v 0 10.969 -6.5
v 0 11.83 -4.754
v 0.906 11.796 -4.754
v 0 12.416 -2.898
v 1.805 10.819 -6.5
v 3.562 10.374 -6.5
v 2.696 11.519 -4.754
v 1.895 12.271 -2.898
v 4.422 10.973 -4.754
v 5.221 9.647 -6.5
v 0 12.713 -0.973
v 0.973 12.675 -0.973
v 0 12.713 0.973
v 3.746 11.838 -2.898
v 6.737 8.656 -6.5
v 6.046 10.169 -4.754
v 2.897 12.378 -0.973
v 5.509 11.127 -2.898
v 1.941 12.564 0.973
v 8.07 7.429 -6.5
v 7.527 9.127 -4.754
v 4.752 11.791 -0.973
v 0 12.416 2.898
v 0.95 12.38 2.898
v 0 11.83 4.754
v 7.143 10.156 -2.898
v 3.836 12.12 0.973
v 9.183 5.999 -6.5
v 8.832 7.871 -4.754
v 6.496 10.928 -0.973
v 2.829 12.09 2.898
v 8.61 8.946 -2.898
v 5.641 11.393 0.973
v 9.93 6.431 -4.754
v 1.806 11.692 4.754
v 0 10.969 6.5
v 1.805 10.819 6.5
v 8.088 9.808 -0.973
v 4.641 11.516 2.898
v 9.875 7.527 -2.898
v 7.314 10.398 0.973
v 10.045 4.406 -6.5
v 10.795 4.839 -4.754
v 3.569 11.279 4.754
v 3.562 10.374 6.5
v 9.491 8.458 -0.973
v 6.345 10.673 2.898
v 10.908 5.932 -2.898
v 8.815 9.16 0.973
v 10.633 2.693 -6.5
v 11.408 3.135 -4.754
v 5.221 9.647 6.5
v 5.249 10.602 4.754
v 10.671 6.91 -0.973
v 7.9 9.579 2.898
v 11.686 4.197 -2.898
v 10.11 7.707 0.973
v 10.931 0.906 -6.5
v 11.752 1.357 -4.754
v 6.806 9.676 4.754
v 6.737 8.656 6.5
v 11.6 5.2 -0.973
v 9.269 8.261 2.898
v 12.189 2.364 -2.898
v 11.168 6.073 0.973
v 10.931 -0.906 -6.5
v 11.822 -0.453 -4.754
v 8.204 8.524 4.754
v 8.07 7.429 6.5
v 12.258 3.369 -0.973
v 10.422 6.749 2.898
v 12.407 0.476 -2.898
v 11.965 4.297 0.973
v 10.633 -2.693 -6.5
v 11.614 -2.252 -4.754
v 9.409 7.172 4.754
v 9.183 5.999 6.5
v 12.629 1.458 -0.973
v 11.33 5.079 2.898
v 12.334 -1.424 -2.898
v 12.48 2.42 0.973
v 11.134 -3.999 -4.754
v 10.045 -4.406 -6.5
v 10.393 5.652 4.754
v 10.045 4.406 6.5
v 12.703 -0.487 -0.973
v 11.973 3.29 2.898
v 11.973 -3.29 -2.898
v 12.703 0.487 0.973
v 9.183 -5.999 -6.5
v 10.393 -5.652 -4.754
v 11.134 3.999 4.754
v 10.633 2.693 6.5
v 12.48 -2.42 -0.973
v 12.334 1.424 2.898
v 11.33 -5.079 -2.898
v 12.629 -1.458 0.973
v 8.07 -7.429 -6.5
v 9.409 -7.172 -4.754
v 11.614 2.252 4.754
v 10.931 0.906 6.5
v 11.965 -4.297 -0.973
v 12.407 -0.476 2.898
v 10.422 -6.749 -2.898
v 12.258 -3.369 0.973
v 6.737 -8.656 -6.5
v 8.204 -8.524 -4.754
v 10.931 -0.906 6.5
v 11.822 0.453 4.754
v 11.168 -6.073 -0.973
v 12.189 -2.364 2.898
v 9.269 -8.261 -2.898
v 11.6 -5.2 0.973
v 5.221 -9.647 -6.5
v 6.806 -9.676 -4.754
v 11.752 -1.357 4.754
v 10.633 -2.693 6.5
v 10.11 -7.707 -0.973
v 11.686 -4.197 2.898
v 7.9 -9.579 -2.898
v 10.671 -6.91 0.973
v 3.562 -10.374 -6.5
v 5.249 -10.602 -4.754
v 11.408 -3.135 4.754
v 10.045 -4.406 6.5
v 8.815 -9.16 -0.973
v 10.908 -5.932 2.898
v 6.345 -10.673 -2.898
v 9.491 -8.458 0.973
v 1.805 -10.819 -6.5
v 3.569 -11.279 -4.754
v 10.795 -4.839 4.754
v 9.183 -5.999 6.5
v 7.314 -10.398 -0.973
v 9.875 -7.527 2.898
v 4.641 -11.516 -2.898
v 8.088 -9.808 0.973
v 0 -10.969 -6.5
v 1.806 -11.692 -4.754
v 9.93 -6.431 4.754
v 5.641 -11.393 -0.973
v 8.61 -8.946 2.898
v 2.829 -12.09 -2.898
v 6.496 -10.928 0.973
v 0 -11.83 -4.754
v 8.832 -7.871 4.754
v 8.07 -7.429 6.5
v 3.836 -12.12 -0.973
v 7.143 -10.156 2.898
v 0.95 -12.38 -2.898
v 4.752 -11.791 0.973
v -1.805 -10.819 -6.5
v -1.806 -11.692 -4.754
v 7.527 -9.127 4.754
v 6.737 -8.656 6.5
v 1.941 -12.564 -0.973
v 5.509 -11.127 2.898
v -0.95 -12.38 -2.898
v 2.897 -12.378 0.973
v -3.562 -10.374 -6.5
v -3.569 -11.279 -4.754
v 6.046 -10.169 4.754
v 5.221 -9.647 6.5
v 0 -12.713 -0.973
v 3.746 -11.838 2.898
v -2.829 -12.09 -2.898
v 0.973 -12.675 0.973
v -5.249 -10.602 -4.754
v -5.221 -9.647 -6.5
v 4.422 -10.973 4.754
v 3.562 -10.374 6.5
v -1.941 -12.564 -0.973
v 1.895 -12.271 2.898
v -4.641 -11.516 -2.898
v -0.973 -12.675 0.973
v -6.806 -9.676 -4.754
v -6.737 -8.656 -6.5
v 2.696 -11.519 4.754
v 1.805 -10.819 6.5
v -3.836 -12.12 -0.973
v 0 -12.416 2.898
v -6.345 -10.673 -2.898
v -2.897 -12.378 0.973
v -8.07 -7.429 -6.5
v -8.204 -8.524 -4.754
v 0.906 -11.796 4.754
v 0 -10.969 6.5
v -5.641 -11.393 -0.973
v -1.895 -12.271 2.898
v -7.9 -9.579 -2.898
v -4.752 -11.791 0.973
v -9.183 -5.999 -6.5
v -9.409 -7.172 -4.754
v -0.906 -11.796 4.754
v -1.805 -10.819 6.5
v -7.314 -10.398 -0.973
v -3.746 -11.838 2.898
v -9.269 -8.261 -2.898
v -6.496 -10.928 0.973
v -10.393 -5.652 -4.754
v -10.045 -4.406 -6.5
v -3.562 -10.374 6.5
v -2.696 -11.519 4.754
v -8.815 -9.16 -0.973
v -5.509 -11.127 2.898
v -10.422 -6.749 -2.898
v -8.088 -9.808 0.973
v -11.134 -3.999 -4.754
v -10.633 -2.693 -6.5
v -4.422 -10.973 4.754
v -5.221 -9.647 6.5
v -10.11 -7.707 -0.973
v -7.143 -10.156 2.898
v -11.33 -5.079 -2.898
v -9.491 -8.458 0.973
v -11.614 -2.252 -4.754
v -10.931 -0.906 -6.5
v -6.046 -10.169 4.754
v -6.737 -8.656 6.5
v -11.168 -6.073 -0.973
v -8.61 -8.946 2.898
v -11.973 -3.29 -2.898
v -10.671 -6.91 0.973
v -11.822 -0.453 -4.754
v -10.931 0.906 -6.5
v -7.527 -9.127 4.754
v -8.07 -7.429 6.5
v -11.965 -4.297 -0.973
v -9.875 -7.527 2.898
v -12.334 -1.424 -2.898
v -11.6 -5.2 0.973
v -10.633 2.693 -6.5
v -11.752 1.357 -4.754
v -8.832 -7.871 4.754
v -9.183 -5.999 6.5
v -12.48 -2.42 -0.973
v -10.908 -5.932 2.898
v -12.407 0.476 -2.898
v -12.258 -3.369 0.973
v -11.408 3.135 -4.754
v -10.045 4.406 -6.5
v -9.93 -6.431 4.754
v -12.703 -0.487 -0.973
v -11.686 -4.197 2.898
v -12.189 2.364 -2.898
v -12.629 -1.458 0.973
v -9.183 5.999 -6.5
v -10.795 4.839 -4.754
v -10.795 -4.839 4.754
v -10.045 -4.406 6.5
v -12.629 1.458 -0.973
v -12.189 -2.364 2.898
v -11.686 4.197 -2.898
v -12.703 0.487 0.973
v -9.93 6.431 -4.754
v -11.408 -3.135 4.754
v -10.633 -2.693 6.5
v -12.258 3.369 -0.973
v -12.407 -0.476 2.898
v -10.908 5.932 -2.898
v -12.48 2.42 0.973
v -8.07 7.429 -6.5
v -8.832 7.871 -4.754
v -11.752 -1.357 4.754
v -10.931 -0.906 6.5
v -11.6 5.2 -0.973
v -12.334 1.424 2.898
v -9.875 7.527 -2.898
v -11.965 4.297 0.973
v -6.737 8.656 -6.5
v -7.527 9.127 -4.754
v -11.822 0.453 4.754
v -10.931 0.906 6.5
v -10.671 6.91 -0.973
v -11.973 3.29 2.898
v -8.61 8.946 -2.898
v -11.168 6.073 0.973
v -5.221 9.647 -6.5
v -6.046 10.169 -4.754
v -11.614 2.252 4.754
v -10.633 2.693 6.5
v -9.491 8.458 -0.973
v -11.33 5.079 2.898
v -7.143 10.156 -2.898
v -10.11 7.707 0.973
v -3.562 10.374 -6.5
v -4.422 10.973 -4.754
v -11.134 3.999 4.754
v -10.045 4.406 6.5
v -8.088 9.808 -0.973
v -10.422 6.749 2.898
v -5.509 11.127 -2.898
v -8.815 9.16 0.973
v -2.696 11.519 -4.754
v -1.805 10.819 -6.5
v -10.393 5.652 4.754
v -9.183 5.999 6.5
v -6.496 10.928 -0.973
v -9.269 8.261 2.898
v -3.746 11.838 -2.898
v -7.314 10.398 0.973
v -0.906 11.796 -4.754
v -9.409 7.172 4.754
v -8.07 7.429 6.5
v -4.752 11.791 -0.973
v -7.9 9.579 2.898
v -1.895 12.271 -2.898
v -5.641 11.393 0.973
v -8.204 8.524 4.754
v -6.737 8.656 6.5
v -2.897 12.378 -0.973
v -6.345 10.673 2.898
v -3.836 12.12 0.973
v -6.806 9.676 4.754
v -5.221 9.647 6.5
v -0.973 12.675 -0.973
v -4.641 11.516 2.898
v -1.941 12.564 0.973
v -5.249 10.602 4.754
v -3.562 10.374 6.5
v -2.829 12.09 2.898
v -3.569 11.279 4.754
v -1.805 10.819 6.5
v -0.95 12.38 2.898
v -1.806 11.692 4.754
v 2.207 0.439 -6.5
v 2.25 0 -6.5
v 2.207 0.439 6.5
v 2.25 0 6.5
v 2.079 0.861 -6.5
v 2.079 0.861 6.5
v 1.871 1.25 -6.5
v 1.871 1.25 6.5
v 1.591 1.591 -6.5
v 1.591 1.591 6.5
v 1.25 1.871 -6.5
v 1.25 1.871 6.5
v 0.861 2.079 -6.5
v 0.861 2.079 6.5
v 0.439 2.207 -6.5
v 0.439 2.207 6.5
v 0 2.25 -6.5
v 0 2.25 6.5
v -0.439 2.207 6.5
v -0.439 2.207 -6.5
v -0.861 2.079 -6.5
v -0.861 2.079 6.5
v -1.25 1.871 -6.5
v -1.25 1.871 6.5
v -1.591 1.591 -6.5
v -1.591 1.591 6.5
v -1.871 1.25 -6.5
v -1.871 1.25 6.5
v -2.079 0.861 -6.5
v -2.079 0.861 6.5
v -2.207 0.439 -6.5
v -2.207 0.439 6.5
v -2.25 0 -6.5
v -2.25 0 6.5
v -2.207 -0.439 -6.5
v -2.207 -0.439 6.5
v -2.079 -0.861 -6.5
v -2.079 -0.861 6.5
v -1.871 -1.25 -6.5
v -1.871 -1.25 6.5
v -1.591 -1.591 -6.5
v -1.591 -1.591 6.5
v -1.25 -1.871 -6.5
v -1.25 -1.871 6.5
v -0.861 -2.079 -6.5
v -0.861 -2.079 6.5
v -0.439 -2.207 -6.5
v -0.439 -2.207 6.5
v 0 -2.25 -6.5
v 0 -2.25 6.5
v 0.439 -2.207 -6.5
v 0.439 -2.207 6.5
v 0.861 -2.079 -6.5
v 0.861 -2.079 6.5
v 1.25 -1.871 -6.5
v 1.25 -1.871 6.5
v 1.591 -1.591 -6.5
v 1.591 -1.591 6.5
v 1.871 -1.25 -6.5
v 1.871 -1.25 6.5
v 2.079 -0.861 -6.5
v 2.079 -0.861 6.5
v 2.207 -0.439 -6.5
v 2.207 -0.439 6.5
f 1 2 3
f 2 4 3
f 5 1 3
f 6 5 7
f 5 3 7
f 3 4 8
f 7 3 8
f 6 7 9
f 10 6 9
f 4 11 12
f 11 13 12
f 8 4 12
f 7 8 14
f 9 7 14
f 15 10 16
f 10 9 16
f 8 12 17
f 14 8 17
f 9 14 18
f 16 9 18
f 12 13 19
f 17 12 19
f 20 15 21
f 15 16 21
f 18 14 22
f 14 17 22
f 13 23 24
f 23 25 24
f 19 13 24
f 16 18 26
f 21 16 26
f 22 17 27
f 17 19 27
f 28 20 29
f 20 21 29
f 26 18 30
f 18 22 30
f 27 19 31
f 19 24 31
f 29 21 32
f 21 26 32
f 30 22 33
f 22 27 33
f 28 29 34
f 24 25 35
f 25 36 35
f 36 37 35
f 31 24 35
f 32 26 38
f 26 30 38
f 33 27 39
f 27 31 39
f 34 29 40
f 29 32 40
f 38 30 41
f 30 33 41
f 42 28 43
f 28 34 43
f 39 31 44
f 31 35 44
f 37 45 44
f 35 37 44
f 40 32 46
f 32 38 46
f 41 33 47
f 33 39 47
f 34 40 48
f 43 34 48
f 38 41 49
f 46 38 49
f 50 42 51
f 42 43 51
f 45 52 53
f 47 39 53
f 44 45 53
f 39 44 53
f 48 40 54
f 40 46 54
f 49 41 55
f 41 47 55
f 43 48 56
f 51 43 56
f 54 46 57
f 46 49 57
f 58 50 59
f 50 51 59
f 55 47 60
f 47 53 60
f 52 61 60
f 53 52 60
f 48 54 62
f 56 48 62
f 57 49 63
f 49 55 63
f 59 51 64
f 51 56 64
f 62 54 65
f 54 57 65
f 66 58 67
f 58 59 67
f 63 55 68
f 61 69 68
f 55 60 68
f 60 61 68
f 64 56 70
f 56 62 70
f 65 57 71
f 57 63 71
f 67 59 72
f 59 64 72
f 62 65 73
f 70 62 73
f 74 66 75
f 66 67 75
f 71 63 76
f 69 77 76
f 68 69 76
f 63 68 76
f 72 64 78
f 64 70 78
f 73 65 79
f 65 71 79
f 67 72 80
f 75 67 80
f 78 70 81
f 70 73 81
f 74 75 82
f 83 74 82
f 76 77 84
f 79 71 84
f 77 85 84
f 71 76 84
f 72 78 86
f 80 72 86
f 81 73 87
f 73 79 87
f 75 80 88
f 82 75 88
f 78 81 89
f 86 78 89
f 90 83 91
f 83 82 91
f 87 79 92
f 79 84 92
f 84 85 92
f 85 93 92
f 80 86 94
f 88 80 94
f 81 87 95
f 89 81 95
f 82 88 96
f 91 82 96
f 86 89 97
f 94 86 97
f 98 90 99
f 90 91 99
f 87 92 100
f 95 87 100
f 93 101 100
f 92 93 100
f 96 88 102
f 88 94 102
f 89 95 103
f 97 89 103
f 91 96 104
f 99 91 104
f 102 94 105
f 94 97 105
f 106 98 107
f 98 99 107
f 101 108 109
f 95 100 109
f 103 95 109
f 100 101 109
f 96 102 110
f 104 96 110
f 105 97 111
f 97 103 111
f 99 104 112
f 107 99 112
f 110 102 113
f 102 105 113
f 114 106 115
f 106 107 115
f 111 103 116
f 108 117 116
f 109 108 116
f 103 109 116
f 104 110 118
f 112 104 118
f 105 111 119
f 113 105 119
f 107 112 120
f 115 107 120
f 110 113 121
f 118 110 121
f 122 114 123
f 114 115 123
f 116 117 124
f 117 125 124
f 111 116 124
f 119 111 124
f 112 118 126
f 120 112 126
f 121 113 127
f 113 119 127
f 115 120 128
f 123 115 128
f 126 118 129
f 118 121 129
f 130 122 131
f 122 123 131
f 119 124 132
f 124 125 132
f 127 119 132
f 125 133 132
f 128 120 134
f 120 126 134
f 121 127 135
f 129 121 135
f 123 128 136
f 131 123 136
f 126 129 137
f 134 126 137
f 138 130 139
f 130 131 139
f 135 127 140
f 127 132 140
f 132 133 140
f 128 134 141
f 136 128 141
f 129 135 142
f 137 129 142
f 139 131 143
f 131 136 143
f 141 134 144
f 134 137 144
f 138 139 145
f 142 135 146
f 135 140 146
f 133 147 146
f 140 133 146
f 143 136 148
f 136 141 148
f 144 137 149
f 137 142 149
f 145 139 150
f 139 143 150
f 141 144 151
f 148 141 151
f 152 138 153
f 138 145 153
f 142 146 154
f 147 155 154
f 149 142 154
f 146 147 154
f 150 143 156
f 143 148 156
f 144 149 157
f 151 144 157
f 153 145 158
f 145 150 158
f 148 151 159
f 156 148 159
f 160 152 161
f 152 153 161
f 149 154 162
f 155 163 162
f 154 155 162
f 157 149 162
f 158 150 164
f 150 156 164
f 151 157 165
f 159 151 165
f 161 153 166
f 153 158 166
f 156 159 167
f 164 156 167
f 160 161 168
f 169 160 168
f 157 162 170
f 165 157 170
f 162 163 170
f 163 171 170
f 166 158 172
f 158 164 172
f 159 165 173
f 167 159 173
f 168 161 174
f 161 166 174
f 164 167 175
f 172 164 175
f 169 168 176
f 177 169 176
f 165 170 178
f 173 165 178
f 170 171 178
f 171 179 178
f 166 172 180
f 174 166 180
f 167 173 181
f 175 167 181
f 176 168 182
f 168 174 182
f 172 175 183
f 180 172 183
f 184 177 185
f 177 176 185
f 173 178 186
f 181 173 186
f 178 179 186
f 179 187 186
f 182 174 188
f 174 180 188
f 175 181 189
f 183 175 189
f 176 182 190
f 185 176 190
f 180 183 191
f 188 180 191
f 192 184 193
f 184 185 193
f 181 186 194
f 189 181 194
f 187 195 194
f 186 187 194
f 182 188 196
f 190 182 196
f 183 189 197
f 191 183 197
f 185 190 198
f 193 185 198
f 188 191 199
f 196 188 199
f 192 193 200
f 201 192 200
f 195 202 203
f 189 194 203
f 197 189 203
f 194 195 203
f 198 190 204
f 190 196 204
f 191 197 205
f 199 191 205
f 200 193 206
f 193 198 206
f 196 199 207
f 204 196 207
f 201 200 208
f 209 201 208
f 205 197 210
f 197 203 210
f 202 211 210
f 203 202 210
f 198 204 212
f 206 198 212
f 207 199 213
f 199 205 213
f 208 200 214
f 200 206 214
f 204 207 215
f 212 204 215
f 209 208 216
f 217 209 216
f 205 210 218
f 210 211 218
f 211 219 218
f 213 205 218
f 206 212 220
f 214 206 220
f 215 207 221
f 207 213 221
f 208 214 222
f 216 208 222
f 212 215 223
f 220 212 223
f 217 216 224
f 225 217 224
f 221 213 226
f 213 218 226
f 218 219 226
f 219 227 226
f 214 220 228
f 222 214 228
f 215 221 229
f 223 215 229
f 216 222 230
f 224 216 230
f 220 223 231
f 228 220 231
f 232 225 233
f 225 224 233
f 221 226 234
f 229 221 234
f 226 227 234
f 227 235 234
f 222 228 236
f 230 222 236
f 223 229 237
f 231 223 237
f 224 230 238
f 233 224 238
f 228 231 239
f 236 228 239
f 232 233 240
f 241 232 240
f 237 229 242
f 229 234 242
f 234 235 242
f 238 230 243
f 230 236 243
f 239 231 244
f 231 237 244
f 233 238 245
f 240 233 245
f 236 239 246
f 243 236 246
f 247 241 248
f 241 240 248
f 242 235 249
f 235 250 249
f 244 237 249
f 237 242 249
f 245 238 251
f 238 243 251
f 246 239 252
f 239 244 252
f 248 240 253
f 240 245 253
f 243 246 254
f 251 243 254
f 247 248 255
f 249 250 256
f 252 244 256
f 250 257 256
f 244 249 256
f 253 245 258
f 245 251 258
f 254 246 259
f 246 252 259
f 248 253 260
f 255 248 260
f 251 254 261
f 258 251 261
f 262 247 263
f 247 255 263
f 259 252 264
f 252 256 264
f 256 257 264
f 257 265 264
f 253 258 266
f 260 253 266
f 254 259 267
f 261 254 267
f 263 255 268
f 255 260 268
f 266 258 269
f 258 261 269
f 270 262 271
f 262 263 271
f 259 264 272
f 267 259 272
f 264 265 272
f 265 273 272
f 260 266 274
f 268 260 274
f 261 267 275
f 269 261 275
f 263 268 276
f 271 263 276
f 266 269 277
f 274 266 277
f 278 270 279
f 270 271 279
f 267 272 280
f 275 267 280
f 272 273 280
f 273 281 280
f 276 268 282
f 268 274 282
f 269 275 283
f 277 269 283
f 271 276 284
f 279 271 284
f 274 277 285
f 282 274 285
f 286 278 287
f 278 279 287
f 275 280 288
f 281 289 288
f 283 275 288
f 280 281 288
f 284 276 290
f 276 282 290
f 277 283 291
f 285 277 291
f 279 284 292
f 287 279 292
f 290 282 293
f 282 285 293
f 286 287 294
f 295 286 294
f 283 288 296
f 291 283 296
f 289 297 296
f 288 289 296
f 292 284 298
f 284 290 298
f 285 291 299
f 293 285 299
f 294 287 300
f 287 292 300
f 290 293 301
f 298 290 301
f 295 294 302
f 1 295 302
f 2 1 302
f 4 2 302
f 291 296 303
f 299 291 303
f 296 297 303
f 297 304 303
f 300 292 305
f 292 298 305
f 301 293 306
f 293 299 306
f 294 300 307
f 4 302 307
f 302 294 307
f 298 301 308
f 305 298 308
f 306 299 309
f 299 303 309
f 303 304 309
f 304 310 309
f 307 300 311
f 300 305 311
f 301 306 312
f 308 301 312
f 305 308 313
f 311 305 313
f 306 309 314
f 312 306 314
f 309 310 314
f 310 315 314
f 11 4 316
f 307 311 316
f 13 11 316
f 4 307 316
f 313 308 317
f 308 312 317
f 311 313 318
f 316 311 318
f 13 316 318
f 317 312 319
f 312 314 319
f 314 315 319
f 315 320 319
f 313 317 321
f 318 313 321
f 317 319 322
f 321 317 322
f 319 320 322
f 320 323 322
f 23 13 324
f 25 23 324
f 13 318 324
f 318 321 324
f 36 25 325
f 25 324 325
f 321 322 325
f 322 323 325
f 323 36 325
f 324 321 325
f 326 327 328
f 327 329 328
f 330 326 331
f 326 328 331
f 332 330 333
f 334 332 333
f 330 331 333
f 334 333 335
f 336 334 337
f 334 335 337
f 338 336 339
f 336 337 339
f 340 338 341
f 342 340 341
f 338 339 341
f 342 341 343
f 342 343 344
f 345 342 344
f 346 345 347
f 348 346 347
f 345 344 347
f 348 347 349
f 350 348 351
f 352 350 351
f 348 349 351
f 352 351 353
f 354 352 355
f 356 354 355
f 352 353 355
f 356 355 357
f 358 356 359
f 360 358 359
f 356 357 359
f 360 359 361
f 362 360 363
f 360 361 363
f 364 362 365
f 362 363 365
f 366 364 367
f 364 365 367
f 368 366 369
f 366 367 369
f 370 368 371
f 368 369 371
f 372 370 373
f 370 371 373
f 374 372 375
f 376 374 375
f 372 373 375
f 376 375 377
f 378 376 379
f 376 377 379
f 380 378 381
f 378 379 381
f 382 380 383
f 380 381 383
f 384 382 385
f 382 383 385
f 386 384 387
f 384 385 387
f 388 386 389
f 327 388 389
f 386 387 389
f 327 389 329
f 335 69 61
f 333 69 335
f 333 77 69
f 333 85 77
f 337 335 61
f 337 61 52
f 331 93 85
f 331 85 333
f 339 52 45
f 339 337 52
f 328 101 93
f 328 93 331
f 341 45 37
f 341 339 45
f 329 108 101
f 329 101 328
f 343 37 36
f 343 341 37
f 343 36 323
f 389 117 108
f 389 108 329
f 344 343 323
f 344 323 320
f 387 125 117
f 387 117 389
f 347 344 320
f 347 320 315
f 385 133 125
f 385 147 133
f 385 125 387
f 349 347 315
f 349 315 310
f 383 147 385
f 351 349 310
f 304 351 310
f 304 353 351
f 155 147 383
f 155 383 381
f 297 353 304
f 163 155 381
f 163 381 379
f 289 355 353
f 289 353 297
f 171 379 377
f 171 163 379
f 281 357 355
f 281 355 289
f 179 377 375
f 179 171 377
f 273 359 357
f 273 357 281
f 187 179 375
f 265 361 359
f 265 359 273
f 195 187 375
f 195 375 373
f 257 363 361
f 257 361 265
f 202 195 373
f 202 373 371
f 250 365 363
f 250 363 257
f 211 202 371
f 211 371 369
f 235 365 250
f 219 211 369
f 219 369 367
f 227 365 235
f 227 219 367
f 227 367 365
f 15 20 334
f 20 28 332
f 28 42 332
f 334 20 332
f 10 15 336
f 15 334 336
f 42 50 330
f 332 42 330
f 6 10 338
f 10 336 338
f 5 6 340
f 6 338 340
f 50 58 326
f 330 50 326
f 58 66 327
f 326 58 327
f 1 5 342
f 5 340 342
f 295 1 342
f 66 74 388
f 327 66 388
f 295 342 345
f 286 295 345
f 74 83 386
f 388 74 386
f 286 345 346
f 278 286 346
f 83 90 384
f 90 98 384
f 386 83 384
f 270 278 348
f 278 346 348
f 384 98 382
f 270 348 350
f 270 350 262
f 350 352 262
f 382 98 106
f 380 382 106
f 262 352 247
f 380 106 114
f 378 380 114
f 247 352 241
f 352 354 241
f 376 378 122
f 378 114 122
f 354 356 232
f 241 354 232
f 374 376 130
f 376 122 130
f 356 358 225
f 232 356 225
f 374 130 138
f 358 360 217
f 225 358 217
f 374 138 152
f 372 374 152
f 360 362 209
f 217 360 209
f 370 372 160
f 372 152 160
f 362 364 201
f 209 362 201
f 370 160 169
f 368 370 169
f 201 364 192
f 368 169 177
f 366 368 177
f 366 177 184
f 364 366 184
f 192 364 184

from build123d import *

# Parameters (mm, degrees)
SKIZZE1_R                       = 12.75
AUFSATZ_LINEAR_AUSTRAGEN1_DEPTH = 6.5
SKIZZE2_R                       = 2.25
SCHNITT_LINEAR_AUSTRAGEN1_DEPTH = 6.5


with BuildPart() as part:
    # Skizze1 → Aufsatz-Linear austragen1 (new, symmetric)
    with BuildSketch(Plane.XY):
        with Locations(Location((0, 0, 0), (0, 0, 180))):
            Circle(SKIZZE1_R)
    extrude(amount=AUFSATZ_LINEAR_AUSTRAGEN1_DEPTH, both=True)

    # Skizze2 → Schnitt-Linear austragen1 (cut, symmetric)
    with BuildSketch(Plane.XY):
        Circle(SKIZZE2_R)
    extrude(amount=SCHNITT_LINEAR_AUSTRAGEN1_DEPTH, both=True, mode=Mode.SUBTRACT)

    # Skizze3 → Schnitt-Rotation2 (revolve, cut)
    with BuildSketch(Plane(origin=(0, 0, 0), x_dir=(0, 0, -1), z_dir=(1, 0, 0))):
        with BuildLine():
            Line((-6.5, 10.968705484), (-6.5, 13.936393614))
            Line((-6.5, 13.936393614), (6.5, 13.936393614))
            Line((6.5, 13.936393614), (6.5, 10.968705484))
            ThreePointArc((6.5, 10.968705484), (0, 12.75), (-6.5, 10.968705484))
        make_face()
    revolve(axis=Axis((0, 0, 6.5), (0, 0, -1)), mode=Mode.SUBTRACT)


solid = part.part
